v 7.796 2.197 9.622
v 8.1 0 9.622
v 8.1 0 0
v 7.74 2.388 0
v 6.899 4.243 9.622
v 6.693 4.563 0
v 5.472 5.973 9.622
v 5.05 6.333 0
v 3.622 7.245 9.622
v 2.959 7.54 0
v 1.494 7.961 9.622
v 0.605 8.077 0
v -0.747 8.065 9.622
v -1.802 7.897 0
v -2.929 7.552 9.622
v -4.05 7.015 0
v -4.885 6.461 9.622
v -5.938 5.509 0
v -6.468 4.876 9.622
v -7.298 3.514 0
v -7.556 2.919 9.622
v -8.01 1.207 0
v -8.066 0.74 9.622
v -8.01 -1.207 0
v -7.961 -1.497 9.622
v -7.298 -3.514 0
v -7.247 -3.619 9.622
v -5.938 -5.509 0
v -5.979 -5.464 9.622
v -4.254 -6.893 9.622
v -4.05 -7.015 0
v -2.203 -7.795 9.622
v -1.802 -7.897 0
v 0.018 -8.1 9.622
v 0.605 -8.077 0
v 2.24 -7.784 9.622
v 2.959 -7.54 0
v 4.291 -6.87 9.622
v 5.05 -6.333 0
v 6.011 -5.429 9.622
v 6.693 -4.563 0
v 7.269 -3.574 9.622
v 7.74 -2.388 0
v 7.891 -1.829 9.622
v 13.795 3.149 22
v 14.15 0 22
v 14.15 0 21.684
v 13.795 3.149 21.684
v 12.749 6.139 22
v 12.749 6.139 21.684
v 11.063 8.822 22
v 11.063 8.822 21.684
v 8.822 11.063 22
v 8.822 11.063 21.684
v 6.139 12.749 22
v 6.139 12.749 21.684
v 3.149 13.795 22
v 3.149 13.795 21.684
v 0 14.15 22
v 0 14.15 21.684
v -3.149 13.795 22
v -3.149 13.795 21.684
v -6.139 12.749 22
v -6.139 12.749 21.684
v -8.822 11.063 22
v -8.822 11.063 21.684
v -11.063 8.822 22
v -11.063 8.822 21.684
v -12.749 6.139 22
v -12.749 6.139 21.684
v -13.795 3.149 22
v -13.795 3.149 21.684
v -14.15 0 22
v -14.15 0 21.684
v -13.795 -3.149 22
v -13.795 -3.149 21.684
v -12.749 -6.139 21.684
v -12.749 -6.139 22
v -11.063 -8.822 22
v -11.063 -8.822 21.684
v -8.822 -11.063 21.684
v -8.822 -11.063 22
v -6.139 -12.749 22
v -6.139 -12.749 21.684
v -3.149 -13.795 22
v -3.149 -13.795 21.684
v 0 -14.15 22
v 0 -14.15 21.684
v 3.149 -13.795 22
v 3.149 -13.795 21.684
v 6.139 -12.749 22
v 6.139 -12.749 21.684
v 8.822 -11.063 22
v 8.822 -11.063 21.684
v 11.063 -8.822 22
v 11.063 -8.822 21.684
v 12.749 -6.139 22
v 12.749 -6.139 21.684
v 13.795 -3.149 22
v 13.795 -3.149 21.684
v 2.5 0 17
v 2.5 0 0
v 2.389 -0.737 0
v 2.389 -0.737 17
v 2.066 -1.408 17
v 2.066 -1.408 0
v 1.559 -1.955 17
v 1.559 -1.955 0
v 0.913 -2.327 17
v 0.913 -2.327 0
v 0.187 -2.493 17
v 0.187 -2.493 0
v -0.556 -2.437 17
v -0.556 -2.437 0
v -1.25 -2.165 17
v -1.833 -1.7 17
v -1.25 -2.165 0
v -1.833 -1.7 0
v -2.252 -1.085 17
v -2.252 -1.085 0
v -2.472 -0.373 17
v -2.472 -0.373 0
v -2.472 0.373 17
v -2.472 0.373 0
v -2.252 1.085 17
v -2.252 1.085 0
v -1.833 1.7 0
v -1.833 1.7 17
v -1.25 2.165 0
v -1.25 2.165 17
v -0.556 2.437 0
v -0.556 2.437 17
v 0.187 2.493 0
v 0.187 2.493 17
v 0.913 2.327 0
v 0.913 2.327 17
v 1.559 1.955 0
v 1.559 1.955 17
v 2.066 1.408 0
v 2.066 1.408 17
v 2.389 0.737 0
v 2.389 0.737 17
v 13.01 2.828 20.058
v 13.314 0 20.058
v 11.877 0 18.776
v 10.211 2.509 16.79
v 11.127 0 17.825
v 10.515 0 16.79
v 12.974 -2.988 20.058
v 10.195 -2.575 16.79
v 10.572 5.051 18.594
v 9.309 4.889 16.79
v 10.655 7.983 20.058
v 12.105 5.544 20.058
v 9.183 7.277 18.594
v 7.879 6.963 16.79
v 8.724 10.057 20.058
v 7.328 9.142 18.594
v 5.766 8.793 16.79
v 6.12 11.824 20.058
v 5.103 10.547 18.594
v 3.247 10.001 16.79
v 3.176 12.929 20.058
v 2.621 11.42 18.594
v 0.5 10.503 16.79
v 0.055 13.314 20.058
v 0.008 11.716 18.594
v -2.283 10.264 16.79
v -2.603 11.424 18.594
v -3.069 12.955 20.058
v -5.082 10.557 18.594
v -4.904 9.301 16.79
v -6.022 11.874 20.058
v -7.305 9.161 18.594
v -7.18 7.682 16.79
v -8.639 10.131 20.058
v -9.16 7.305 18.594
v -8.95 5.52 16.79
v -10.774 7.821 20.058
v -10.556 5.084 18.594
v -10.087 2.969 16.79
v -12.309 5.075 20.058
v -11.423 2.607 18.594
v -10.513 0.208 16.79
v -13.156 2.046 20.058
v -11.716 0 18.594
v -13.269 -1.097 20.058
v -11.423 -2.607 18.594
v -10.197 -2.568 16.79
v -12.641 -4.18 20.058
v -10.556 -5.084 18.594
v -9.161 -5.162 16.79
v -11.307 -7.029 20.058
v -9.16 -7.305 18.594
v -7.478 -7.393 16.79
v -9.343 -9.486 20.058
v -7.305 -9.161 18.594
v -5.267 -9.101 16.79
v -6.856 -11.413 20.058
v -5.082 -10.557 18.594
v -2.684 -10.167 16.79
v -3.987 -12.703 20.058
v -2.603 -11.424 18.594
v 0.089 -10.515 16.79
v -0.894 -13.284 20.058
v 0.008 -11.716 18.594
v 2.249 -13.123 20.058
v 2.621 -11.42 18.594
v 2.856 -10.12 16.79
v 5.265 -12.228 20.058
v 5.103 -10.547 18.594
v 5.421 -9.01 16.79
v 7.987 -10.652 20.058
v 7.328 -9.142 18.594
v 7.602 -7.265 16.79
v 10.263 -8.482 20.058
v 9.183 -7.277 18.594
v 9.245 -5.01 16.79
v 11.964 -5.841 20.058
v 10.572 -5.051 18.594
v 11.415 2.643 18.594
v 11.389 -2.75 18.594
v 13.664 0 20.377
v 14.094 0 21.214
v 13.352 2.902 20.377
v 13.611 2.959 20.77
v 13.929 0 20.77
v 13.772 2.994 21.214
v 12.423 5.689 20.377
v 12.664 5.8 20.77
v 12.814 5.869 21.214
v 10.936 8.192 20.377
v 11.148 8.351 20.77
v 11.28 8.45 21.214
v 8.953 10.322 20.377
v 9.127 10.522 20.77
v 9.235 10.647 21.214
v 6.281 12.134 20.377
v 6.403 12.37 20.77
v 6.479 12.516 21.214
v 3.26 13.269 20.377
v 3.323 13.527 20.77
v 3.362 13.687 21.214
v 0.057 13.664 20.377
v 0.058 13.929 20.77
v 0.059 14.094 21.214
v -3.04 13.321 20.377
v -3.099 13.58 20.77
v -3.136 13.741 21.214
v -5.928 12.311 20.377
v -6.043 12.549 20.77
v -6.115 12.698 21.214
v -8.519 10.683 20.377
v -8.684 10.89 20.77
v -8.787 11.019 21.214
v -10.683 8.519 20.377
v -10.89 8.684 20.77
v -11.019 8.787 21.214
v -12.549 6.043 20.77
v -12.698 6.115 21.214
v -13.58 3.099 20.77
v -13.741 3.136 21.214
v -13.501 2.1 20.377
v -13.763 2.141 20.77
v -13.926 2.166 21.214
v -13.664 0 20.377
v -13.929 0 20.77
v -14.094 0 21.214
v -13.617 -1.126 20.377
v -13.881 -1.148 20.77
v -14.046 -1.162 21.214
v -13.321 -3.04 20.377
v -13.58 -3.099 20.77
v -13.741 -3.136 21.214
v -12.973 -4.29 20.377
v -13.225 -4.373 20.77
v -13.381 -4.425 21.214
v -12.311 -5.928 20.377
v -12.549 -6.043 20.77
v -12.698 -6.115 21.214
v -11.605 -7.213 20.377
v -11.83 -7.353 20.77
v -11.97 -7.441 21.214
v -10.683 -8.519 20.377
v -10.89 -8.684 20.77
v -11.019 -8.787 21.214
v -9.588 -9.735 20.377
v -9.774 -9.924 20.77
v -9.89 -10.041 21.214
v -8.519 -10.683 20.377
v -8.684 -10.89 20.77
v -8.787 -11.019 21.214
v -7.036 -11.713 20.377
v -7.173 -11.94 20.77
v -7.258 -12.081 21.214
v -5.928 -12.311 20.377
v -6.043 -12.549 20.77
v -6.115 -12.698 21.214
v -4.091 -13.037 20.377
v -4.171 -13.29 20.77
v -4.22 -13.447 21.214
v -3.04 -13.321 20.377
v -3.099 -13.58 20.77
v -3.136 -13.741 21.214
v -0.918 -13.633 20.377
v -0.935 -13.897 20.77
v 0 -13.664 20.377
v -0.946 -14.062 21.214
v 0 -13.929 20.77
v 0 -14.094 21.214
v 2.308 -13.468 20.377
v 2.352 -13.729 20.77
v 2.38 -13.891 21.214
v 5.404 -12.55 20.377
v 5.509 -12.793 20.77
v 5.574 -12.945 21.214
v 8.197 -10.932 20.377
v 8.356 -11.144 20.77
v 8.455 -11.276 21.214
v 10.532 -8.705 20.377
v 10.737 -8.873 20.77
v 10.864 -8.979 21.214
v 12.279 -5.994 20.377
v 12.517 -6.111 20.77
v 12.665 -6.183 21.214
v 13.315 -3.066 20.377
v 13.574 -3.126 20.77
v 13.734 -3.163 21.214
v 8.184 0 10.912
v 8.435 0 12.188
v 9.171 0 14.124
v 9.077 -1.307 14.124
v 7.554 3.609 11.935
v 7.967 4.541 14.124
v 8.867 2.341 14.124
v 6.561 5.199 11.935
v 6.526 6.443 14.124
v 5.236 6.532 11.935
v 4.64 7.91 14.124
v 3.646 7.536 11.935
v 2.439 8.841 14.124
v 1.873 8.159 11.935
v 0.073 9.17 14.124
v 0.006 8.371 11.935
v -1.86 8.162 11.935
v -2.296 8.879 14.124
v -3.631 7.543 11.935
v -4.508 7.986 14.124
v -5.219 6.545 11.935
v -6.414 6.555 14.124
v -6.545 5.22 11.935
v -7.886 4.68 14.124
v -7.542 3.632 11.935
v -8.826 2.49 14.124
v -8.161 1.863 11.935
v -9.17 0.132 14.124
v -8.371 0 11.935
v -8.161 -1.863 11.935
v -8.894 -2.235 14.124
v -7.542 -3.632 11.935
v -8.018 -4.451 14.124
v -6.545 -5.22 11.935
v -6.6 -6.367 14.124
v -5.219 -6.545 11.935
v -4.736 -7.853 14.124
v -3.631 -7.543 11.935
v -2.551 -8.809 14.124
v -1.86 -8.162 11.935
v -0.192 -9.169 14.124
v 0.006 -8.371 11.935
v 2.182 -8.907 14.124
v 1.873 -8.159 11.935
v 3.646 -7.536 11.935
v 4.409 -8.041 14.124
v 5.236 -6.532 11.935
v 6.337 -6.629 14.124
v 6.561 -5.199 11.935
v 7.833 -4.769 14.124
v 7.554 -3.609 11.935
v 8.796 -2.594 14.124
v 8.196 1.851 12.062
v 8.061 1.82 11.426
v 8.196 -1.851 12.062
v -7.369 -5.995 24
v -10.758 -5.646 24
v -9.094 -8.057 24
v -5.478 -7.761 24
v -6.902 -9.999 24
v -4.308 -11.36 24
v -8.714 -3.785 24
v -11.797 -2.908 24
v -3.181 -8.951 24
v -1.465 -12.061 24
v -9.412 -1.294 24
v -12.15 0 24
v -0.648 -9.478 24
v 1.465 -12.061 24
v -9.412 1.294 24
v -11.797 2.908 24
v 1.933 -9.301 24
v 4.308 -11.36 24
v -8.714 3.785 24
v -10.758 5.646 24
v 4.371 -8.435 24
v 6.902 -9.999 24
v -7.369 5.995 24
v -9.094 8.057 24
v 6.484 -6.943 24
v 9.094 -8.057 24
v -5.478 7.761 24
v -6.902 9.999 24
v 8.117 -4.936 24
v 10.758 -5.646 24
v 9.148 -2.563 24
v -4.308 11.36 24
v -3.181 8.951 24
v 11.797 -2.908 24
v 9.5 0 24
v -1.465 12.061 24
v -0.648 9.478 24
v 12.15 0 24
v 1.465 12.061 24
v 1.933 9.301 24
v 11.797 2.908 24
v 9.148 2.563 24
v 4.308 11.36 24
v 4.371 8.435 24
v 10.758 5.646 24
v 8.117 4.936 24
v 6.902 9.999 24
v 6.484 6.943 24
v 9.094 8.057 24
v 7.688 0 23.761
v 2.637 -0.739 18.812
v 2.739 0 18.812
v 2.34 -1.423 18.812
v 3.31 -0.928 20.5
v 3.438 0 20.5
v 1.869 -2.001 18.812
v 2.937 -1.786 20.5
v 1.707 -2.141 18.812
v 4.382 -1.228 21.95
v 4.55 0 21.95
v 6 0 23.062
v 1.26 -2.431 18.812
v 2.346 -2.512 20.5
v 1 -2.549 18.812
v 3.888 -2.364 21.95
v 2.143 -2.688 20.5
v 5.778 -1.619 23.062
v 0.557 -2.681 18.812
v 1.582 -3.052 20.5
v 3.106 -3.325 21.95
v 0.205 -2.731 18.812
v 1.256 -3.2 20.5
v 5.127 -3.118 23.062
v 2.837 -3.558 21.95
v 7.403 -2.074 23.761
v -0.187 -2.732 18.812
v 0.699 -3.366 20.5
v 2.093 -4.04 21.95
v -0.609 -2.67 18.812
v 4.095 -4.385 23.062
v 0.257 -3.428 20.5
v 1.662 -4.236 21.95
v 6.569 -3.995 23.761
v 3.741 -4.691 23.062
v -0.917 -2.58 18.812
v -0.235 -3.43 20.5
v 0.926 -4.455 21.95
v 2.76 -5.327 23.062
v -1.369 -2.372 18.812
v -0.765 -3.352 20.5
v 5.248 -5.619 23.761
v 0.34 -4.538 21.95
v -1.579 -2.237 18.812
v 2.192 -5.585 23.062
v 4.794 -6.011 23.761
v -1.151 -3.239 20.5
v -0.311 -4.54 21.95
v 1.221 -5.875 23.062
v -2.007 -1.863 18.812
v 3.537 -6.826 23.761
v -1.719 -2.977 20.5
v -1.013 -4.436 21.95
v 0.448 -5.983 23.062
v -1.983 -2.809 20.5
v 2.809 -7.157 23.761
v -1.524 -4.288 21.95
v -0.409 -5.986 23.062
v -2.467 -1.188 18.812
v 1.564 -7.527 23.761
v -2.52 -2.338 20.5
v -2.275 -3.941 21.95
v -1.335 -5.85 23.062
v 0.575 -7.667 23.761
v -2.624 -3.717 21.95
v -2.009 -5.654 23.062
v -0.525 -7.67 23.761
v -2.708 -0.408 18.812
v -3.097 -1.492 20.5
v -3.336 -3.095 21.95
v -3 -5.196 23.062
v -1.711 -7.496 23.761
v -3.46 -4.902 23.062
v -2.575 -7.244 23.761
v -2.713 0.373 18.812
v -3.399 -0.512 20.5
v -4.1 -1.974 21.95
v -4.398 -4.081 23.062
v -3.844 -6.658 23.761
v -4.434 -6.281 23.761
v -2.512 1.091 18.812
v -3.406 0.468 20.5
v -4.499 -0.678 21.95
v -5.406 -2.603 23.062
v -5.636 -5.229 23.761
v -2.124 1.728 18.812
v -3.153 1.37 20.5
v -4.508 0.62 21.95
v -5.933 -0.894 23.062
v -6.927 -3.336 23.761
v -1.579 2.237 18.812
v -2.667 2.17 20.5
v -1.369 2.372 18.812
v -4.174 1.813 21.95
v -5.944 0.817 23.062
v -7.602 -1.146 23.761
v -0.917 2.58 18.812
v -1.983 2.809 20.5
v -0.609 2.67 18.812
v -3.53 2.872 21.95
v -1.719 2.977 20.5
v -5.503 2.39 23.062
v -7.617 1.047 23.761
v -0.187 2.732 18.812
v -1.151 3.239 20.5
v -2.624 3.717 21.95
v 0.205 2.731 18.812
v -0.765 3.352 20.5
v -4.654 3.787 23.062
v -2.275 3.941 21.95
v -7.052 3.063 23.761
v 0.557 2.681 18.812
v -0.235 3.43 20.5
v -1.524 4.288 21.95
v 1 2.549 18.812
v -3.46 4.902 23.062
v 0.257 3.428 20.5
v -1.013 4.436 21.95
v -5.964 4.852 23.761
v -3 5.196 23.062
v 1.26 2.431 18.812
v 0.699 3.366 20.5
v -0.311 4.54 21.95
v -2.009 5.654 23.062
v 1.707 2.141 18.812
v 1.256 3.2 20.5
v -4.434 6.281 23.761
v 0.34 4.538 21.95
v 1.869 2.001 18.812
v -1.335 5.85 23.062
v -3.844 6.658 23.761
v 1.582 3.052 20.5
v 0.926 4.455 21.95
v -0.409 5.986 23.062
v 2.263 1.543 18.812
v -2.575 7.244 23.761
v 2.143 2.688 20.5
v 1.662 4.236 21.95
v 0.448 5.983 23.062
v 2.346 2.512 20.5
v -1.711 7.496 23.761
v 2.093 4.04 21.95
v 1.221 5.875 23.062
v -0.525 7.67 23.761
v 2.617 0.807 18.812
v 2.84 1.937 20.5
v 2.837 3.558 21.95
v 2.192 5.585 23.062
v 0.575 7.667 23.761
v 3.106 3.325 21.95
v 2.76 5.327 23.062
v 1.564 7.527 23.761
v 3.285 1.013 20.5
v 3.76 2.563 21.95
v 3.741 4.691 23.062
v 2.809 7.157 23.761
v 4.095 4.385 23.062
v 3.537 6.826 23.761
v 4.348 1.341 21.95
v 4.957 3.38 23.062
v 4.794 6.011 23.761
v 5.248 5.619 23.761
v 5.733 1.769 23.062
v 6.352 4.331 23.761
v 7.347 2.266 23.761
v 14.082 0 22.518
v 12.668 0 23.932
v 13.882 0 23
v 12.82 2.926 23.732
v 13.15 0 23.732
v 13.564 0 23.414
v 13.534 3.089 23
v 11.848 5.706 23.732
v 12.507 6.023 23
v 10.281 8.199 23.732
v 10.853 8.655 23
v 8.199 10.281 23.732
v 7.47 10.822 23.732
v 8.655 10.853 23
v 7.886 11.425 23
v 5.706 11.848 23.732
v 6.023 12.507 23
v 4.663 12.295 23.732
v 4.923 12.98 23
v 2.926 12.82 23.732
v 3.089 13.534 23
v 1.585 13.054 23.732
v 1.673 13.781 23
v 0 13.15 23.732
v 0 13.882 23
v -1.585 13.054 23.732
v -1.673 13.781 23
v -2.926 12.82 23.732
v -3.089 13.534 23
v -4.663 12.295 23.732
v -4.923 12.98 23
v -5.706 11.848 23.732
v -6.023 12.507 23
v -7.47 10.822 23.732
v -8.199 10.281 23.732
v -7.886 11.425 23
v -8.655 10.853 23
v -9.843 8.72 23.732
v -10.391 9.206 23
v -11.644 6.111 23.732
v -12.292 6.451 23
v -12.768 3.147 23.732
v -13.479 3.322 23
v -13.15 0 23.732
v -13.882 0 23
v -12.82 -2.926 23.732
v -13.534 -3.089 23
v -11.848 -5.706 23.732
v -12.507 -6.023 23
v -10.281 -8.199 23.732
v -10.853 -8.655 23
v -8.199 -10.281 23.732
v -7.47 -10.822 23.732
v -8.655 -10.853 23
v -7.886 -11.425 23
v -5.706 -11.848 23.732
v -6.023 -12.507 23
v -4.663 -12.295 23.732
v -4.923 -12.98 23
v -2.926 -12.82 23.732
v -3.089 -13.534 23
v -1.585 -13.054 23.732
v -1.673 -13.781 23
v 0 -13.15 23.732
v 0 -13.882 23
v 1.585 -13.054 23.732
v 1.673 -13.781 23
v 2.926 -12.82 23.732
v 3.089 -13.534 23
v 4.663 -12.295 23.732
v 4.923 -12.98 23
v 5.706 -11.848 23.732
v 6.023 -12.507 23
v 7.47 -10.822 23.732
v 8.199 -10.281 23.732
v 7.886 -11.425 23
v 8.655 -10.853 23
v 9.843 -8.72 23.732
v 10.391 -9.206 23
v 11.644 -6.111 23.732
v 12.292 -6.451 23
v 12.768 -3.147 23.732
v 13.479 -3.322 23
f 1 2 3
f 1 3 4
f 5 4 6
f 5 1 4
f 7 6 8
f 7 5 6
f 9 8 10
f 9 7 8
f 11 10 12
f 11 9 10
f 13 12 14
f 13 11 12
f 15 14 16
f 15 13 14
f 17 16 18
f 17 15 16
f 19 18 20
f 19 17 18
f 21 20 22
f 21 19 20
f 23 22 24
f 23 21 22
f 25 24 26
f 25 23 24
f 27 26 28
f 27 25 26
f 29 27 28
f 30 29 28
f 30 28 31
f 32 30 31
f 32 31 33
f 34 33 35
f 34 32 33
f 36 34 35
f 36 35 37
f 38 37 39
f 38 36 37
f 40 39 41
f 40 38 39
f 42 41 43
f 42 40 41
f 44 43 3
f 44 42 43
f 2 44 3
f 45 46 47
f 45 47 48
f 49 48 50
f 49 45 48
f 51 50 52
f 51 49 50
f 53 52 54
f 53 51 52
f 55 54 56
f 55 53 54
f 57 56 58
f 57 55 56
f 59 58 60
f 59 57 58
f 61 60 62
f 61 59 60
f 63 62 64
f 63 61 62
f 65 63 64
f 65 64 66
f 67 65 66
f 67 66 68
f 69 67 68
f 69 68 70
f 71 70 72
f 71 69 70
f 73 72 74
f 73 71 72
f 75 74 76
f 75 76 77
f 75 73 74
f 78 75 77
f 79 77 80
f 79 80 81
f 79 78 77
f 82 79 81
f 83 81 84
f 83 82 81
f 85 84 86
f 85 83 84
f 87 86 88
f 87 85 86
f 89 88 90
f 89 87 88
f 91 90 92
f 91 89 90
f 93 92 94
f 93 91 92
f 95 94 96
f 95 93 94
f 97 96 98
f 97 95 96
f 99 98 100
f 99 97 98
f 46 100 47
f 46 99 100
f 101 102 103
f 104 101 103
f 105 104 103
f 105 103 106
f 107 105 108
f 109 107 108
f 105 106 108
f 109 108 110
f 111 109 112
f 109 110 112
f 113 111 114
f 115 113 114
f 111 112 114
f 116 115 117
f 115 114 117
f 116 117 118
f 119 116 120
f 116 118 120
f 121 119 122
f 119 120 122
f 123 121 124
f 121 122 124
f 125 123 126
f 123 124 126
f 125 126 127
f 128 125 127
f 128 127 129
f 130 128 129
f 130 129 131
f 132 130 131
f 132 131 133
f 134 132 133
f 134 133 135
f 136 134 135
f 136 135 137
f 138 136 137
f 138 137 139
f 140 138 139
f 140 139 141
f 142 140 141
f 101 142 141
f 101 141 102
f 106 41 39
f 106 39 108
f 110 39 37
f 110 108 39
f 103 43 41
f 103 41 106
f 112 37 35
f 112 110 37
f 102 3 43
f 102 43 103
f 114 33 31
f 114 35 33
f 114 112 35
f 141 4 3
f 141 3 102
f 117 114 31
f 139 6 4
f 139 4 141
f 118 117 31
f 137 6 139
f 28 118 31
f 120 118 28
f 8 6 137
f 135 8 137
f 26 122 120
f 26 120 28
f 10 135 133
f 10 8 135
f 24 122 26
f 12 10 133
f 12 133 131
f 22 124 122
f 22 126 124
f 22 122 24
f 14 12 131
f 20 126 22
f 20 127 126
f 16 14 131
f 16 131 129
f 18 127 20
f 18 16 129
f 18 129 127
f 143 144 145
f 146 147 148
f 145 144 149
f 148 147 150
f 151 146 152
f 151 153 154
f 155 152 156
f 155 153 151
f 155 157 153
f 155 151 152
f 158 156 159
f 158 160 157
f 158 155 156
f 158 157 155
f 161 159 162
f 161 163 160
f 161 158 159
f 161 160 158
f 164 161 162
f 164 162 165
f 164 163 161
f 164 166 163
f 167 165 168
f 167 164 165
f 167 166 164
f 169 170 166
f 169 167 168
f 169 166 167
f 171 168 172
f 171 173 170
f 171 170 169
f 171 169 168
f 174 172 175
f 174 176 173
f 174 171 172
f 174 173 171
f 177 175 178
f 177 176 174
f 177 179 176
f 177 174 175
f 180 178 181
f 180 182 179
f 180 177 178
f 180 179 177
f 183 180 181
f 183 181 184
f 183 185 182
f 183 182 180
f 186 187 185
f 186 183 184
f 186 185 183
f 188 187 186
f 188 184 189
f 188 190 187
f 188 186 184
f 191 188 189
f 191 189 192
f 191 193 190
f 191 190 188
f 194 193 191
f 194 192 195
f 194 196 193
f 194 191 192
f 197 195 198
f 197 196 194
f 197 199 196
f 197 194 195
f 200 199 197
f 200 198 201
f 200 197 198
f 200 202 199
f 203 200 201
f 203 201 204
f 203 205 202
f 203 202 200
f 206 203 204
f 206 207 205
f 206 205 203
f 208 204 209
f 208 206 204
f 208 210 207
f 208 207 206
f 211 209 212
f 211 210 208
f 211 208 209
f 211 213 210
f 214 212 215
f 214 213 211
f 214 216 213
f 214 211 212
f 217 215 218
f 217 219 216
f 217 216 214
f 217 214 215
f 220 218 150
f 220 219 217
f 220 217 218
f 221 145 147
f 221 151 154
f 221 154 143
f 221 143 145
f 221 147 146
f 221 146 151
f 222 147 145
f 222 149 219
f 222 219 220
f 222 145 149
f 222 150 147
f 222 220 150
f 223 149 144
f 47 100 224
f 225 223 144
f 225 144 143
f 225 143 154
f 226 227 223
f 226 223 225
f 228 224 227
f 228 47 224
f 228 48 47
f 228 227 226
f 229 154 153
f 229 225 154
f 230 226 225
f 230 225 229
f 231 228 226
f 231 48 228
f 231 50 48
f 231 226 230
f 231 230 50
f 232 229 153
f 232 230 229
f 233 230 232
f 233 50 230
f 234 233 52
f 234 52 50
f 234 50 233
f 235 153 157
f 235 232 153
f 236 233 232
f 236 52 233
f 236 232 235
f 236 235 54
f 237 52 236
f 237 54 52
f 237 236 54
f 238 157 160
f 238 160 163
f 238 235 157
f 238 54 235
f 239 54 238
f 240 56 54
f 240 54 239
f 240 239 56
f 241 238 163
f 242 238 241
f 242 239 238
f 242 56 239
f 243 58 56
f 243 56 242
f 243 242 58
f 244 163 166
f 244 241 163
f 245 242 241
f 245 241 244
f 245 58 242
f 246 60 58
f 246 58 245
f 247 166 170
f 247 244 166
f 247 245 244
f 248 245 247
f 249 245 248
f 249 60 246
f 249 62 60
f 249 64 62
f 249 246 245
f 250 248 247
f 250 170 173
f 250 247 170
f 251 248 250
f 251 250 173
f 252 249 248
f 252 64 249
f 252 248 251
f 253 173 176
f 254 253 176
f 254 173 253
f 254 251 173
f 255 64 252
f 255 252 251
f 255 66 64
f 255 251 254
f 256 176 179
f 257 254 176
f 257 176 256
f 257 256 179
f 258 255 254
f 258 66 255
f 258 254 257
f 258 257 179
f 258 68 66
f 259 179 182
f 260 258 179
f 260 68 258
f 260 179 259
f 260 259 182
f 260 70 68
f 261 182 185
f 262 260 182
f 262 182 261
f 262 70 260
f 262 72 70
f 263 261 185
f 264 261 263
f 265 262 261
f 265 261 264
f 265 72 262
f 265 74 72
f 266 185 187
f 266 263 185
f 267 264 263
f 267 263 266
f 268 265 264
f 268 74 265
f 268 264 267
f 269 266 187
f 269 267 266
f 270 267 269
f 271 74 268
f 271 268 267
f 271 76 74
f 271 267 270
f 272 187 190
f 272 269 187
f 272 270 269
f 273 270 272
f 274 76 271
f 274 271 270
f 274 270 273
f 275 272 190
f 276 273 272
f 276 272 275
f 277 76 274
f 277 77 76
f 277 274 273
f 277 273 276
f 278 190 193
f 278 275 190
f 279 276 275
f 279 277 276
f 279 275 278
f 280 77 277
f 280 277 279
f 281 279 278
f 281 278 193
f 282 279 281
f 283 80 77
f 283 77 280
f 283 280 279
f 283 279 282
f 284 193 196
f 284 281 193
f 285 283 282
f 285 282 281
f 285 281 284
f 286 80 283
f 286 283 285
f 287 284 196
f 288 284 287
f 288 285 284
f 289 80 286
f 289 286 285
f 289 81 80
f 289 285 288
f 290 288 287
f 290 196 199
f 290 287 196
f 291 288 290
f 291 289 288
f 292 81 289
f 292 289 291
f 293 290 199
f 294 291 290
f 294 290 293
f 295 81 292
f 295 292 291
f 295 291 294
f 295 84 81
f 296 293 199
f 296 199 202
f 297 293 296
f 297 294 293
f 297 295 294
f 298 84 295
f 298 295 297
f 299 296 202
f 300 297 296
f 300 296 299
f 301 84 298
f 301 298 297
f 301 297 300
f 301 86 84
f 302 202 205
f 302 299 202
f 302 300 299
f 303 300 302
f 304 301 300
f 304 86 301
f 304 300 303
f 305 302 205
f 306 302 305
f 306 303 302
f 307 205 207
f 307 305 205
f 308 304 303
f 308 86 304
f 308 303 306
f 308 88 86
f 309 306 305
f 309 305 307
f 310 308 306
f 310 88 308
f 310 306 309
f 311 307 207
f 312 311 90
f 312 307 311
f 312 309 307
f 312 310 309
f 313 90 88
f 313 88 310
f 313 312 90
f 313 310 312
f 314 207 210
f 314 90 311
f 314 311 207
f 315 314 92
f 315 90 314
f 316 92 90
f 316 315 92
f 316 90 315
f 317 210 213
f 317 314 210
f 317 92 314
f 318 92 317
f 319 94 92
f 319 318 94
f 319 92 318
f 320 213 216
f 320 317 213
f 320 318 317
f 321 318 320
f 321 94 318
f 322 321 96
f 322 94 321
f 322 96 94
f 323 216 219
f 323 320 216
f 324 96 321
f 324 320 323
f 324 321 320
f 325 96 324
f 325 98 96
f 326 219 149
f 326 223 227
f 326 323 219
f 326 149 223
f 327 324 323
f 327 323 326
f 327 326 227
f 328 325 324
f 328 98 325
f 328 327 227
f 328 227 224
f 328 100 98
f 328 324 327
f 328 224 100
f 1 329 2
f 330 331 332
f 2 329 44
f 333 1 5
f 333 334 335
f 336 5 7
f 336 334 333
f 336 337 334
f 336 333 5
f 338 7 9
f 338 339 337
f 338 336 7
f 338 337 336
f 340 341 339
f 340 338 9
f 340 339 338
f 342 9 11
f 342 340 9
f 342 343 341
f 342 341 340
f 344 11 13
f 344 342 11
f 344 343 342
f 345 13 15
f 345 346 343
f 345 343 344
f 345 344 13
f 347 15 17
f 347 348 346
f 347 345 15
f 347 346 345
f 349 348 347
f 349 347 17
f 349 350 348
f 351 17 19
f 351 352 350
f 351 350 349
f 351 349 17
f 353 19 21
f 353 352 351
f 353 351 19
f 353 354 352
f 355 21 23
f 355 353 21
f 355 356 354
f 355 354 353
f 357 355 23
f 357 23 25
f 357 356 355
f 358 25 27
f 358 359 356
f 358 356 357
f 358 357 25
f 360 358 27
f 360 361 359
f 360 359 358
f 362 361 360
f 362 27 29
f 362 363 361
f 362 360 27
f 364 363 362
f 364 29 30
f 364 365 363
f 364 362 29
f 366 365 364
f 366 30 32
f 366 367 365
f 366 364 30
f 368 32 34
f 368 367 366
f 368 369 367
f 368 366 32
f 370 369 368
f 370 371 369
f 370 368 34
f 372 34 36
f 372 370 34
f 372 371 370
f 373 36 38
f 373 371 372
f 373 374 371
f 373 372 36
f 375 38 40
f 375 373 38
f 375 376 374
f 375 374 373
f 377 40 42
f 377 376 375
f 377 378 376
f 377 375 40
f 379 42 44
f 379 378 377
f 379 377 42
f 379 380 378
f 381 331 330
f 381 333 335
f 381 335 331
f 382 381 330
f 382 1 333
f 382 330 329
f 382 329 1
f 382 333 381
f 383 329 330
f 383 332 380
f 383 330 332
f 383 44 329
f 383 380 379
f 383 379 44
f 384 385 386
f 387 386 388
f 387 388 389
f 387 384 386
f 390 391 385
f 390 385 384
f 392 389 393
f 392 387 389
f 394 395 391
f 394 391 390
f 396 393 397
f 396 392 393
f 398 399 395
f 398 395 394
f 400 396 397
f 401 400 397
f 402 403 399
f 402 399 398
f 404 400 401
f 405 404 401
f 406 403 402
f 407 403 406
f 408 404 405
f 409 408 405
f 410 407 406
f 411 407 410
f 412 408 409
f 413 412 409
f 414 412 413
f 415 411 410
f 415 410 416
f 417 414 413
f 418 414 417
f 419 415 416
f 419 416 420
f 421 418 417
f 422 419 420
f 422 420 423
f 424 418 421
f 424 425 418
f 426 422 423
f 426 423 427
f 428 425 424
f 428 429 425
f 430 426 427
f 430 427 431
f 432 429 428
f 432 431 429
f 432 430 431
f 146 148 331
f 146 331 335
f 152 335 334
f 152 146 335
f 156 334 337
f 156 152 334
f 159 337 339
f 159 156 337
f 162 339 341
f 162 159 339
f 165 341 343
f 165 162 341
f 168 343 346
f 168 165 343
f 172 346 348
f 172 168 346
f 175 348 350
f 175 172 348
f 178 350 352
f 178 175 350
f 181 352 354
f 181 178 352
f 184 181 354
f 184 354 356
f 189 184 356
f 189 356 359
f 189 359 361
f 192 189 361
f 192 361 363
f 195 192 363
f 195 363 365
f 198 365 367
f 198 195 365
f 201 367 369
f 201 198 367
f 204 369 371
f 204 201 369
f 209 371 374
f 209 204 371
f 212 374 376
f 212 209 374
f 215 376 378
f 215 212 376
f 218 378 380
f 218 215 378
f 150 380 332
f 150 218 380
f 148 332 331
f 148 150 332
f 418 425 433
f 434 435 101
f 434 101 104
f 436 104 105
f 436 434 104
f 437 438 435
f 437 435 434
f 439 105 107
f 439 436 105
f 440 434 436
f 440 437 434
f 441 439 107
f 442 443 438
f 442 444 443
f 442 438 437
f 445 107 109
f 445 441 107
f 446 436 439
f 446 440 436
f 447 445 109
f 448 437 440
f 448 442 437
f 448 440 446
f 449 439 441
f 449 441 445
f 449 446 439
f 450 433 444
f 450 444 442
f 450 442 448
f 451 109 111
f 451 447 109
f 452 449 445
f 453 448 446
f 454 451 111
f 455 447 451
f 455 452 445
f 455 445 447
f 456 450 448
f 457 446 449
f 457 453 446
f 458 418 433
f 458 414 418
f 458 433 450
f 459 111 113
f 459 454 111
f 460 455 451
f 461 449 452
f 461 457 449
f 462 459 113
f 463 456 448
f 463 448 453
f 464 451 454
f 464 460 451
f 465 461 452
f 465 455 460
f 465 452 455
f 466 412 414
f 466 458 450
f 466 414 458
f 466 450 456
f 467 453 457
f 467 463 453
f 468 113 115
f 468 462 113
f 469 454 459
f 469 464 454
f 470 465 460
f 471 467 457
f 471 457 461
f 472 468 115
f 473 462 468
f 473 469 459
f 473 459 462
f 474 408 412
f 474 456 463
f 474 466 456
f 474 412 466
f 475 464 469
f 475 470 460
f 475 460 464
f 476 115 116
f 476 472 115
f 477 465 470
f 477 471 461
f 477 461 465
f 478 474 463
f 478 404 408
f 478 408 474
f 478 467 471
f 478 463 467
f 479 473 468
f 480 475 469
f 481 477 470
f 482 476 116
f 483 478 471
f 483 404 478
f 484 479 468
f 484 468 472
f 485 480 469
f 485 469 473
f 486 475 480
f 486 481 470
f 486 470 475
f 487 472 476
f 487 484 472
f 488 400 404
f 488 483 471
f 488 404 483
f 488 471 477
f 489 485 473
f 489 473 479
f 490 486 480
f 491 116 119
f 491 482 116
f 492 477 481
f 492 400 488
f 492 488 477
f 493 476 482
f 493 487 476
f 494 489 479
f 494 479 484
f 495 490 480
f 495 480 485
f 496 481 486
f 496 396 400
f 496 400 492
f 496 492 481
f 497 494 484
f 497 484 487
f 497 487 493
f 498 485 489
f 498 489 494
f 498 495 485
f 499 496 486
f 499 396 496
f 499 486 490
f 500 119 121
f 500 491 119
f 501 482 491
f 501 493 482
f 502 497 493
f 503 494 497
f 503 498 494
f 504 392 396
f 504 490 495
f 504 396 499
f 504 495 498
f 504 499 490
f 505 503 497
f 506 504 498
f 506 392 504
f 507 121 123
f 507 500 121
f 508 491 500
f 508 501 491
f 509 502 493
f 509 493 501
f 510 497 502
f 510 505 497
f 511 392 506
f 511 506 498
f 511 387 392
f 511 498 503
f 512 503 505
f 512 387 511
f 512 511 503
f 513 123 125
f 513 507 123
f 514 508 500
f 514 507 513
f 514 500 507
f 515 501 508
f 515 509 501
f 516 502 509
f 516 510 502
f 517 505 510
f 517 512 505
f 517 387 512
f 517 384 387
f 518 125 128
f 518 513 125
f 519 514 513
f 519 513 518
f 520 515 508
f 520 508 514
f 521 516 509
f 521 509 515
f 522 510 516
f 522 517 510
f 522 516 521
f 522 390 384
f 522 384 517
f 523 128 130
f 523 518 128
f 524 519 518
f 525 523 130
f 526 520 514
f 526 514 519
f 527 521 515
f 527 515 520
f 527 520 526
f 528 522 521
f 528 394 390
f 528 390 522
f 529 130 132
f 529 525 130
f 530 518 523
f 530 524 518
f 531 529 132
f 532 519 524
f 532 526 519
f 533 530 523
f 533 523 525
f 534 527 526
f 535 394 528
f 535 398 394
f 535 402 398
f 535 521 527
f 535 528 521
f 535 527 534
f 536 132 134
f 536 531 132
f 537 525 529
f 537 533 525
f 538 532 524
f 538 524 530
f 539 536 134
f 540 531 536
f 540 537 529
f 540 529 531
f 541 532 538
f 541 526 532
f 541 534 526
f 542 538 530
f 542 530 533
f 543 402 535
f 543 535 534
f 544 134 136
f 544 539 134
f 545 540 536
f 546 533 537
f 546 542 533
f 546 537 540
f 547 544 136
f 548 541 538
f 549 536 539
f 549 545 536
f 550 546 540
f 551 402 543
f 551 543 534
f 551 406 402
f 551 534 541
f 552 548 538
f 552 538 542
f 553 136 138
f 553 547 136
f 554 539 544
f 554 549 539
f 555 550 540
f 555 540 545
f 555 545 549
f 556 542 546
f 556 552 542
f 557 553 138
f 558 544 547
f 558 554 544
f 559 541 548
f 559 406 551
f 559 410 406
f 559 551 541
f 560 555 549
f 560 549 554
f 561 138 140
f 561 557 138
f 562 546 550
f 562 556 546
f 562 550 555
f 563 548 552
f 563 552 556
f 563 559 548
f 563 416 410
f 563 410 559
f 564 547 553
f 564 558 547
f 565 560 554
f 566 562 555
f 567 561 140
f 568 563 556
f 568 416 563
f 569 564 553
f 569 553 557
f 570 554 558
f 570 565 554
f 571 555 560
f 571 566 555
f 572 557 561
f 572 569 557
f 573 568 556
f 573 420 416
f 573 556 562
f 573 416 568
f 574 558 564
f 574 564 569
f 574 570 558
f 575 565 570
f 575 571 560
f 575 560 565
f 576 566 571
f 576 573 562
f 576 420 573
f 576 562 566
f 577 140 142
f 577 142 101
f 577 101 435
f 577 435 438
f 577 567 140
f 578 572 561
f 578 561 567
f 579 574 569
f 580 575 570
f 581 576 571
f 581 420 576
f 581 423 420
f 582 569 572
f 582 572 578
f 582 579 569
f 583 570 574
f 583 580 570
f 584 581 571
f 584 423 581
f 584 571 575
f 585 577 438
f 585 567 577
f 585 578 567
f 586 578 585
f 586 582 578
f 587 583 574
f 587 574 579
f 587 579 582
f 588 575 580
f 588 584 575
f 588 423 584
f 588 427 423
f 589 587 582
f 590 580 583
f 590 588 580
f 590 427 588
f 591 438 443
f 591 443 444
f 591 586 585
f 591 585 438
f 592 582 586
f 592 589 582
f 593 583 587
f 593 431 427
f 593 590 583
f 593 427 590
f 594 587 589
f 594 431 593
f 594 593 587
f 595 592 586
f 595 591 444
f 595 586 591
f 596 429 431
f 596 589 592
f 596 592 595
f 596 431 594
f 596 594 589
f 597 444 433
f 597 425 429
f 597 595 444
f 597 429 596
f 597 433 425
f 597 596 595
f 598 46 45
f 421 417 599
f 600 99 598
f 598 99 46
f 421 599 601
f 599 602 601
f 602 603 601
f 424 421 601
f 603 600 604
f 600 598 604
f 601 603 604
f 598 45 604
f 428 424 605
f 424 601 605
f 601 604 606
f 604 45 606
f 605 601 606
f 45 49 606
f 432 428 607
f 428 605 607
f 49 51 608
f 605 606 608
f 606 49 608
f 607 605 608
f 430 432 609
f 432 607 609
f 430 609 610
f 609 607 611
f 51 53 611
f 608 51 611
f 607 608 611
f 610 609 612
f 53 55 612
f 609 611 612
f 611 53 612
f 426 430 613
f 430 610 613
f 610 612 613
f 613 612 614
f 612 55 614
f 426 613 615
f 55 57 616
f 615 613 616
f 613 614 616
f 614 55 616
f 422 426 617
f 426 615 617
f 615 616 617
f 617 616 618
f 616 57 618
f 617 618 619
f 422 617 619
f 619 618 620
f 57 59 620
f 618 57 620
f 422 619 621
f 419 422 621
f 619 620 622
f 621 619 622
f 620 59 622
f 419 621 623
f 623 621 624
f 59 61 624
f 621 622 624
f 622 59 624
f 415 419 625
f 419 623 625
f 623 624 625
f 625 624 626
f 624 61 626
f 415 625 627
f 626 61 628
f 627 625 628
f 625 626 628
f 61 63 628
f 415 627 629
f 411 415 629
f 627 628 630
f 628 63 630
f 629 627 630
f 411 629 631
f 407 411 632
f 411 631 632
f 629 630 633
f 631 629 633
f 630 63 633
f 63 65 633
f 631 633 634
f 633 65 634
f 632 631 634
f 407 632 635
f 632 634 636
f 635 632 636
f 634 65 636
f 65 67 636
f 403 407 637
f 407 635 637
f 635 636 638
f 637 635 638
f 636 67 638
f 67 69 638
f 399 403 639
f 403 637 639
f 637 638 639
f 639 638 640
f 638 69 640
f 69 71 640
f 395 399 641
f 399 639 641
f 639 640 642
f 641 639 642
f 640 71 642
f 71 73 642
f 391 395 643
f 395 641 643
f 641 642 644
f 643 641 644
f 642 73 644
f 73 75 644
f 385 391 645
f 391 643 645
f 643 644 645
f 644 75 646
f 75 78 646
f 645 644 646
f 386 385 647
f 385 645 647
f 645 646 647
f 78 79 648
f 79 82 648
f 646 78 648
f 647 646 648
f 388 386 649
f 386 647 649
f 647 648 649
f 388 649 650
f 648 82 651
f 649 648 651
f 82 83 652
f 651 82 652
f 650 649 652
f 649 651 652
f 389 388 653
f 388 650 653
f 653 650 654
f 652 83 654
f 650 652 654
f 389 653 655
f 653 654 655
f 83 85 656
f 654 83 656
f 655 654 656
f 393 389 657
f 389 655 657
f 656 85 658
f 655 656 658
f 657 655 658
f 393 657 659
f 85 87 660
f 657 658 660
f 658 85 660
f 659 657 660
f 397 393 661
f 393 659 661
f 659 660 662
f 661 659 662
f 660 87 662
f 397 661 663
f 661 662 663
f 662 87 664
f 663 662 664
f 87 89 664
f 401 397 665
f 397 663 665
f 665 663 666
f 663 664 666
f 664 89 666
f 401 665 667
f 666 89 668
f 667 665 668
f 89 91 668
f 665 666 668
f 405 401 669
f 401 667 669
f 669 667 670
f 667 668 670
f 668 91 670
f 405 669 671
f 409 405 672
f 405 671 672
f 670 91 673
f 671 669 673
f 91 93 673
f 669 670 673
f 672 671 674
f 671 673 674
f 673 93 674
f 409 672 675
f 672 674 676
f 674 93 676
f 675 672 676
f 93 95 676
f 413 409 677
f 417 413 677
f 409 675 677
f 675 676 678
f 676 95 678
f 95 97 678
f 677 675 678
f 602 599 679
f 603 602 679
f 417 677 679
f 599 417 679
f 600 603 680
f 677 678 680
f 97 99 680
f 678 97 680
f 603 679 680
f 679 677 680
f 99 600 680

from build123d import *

# Parameters (mm, degrees)
F2_R     = 2.5
F3_DEPTH = 25
F4_R     = 2
F5_R     = 9
F6_R     = 10
F7_R     = 7


with BuildPart() as f1:
    # F0 (on Front) → F1 (revolve)
    with BuildSketch(Plane.XZ):
        Polygon((0, 24), (0, 0), (8.1, 0), (8.1, 12), (11.974087, 19.68414), (14.15, 19.68414), (14.15, 24), align=None)
    revolve(axis=Axis((0, 0, 12), (0, 0, 1)))

    # F2 (on face) → F3 (cut)
    with BuildSketch(Plane(origin=(0, 0, 0), x_dir=(1, 0, 0), z_dir=(0, 0, -1))):
        Circle(F2_R)
    extrude(amount=-F3_DEPTH, mode=Mode.SUBTRACT)

    # F4
    f4_edges = [f1.edges().sort_by_distance(p)[0] for p in [
        (-14.15, 0, 24),
        (-14.15, 0, 19.68414),
    ]]
    fillet(f4_edges, radius=F4_R)

    # F5
    f5_edges = [f1.edges().sort_by_distance(p)[0] for p in [
        (-11.974087, 0, 19.68414),
    ]]
    fillet(f5_edges, radius=F5_R)

    # F6
    f6_edges = [f1.edges().sort_by_distance(p)[0] for p in [
        (-8.1, 0, 12),
    ]]
    fillet(f6_edges, radius=F6_R)

    # F7
    f7_edges = [f1.edges().sort_by_distance(p)[0] for p in [
        (-2.5, 0, 24),
    ]]
    fillet(f7_edges, radius=F7_R)


solid = f1.part
